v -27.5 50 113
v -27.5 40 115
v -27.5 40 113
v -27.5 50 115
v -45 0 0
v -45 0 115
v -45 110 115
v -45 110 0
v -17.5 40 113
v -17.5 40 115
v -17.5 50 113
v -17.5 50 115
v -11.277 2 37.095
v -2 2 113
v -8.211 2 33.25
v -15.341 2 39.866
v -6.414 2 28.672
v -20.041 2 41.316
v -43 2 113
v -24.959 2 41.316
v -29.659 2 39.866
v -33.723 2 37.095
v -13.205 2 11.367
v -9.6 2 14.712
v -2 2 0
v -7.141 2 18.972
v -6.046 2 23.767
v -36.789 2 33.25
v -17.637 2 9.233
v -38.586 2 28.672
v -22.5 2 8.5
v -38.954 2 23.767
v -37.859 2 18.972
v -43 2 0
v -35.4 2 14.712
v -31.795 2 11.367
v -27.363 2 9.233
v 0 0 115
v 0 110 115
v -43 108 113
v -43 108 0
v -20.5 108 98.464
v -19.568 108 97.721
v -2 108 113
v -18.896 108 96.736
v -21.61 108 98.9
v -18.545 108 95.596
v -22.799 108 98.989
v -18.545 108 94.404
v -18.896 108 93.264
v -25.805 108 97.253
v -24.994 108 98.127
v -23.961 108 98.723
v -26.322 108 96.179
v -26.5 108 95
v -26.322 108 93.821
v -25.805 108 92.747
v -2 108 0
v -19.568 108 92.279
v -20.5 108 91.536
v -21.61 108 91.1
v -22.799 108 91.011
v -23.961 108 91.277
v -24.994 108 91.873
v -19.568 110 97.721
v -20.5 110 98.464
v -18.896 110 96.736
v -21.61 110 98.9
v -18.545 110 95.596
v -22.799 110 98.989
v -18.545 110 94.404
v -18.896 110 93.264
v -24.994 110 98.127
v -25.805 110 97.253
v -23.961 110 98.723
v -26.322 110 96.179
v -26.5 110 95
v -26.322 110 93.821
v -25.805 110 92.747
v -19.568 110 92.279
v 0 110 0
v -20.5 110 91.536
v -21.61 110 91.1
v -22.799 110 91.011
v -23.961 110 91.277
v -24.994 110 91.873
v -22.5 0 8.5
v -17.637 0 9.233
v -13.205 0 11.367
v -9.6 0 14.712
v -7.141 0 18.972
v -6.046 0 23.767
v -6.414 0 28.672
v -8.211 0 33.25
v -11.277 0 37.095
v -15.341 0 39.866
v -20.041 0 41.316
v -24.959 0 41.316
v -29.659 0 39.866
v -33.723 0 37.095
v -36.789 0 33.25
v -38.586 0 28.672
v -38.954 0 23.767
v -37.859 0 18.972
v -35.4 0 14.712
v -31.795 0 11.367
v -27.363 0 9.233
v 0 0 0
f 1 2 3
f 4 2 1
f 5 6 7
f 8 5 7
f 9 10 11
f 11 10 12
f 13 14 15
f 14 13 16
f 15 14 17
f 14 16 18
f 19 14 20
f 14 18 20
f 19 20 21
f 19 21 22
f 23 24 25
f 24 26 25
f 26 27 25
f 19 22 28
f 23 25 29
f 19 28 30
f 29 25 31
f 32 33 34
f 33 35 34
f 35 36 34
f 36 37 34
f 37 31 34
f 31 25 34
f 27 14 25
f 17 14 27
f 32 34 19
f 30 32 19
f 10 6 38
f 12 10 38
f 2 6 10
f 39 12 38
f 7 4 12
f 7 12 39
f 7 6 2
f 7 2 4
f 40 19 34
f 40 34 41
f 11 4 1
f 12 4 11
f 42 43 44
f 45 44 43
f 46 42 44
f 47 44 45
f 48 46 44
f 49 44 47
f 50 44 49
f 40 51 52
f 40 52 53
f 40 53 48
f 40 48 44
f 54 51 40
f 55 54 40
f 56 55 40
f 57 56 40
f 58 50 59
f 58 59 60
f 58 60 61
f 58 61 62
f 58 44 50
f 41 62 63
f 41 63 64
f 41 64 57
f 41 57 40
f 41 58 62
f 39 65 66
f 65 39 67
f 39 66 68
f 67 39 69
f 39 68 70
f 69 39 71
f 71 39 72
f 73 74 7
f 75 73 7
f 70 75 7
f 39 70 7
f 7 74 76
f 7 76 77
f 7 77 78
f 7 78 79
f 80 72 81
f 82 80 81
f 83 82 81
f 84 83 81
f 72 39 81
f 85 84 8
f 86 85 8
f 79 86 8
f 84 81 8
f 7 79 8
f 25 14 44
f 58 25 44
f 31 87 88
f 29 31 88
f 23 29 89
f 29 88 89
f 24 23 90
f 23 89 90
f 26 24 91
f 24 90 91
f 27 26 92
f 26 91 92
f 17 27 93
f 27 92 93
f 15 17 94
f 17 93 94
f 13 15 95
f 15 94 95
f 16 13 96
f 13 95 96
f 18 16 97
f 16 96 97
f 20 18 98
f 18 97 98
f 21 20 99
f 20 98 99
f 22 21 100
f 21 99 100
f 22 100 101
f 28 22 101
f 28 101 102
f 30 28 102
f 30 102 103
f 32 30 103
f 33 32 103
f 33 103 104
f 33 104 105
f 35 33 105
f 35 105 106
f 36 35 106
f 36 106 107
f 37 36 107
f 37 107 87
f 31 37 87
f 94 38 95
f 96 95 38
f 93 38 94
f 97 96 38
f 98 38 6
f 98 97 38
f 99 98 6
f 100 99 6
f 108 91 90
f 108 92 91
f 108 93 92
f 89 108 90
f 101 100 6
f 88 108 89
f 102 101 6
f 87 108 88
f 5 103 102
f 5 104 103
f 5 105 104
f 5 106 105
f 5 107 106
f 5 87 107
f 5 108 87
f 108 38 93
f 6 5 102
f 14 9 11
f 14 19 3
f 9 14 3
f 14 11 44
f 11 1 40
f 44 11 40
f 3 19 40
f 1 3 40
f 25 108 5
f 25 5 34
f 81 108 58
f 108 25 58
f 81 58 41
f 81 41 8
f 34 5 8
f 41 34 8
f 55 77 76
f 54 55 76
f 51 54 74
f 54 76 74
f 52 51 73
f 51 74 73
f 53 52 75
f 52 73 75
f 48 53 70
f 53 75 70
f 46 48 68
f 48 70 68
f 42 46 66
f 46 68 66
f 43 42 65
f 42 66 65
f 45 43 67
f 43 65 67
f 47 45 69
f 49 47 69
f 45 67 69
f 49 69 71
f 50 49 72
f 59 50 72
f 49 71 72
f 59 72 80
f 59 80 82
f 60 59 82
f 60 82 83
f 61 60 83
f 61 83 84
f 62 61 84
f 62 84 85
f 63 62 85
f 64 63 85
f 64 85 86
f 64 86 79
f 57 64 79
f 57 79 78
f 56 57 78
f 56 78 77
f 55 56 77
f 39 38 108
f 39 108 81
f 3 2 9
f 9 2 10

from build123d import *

# Parameters (mm, degrees)
SKETCH1_W           = 110
SKETCH1_H           = 45
BOSS_EXTRUDE1_DEPTH = 115
SHELL1_T            = -2
CUT_EXTRUDE1_REACH  = 167.378
SKETCH2_R           = 16.5
CUT_EXTRUDE2_REACH  = 167.378
SKETCH3_W           = 10
SKETCH3_H           = 10
CUT_EXTRUDE3_REACH  = 167.378
SKETCH4_R           = 4


with BuildPart() as part:
    # Sketch1 → Boss-Extrude1 (new body)
    with BuildSketch(Plane(origin=(0, 0, 0), x_dir=(0, 1, 0), z_dir=(0, 0, 1))):
        with Locations((55, 22.5)):
            Rectangle(SKETCH1_W, SKETCH1_H)
    extrude(amount=BOSS_EXTRUDE1_DEPTH)

    # Shell1
    shell1_openings = [part.faces().sort_by_distance(p)[0] for p in [
        (-22.5, 55, 0),
    ]]
    offset(amount=SHELL1_T, openings=shell1_openings, kind=Kind.INTERSECTION)

    # Sketch2 → Cut-Extrude1 (cut, up to next)
    with BuildSketch(Plane.XZ, mode=Mode.PRIVATE) as cut_extrude1_sk1:
        with Locations(Location((-22.5, 25, 0), (0, 0, 270))):
            Circle(SKETCH2_R)
    cut_extrude1_tool1 = extrude(cut_extrude1_sk1.sketch, amount=-CUT_EXTRUDE1_REACH, mode=Mode.PRIVATE) & part.part
    add(cut_extrude1_tool1.solids().sort_by_distance((-22.5, 0, 25))[0], mode=Mode.SUBTRACT)

    # Sketch3 → Cut-Extrude2 (cut, up to next)
    with BuildSketch(Plane.XY.offset(115), mode=Mode.PRIVATE) as cut_extrude2_sk1:
        with Locations((-22.5, 45)):
            Rectangle(SKETCH3_W, SKETCH3_H)
    cut_extrude2_tool1 = extrude(cut_extrude2_sk1.sketch, amount=-CUT_EXTRUDE2_REACH, mode=Mode.PRIVATE) & part.part
    add(cut_extrude2_tool1.solids().sort_by_distance((-22.5, 45, 115))[0], mode=Mode.SUBTRACT)

    # Sketch4 → Cut-Extrude3 (cut, up to next)
    with BuildSketch(Plane(origin=(0, 110, 0), x_dir=(-1, 0, 0), z_dir=(0, 1, 0)), mode=Mode.PRIVATE) as cut_extrude3_sk1:
        with Locations((22.5, 95)):
            Circle(SKETCH4_R)
    cut_extrude3_tool1 = extrude(cut_extrude3_sk1.sketch, amount=-CUT_EXTRUDE3_REACH, mode=Mode.PRIVATE) & part.part
    add(cut_extrude3_tool1.solids().sort_by_distance((-22.5, 110, 95))[0], mode=Mode.SUBTRACT)


solid = part.part
